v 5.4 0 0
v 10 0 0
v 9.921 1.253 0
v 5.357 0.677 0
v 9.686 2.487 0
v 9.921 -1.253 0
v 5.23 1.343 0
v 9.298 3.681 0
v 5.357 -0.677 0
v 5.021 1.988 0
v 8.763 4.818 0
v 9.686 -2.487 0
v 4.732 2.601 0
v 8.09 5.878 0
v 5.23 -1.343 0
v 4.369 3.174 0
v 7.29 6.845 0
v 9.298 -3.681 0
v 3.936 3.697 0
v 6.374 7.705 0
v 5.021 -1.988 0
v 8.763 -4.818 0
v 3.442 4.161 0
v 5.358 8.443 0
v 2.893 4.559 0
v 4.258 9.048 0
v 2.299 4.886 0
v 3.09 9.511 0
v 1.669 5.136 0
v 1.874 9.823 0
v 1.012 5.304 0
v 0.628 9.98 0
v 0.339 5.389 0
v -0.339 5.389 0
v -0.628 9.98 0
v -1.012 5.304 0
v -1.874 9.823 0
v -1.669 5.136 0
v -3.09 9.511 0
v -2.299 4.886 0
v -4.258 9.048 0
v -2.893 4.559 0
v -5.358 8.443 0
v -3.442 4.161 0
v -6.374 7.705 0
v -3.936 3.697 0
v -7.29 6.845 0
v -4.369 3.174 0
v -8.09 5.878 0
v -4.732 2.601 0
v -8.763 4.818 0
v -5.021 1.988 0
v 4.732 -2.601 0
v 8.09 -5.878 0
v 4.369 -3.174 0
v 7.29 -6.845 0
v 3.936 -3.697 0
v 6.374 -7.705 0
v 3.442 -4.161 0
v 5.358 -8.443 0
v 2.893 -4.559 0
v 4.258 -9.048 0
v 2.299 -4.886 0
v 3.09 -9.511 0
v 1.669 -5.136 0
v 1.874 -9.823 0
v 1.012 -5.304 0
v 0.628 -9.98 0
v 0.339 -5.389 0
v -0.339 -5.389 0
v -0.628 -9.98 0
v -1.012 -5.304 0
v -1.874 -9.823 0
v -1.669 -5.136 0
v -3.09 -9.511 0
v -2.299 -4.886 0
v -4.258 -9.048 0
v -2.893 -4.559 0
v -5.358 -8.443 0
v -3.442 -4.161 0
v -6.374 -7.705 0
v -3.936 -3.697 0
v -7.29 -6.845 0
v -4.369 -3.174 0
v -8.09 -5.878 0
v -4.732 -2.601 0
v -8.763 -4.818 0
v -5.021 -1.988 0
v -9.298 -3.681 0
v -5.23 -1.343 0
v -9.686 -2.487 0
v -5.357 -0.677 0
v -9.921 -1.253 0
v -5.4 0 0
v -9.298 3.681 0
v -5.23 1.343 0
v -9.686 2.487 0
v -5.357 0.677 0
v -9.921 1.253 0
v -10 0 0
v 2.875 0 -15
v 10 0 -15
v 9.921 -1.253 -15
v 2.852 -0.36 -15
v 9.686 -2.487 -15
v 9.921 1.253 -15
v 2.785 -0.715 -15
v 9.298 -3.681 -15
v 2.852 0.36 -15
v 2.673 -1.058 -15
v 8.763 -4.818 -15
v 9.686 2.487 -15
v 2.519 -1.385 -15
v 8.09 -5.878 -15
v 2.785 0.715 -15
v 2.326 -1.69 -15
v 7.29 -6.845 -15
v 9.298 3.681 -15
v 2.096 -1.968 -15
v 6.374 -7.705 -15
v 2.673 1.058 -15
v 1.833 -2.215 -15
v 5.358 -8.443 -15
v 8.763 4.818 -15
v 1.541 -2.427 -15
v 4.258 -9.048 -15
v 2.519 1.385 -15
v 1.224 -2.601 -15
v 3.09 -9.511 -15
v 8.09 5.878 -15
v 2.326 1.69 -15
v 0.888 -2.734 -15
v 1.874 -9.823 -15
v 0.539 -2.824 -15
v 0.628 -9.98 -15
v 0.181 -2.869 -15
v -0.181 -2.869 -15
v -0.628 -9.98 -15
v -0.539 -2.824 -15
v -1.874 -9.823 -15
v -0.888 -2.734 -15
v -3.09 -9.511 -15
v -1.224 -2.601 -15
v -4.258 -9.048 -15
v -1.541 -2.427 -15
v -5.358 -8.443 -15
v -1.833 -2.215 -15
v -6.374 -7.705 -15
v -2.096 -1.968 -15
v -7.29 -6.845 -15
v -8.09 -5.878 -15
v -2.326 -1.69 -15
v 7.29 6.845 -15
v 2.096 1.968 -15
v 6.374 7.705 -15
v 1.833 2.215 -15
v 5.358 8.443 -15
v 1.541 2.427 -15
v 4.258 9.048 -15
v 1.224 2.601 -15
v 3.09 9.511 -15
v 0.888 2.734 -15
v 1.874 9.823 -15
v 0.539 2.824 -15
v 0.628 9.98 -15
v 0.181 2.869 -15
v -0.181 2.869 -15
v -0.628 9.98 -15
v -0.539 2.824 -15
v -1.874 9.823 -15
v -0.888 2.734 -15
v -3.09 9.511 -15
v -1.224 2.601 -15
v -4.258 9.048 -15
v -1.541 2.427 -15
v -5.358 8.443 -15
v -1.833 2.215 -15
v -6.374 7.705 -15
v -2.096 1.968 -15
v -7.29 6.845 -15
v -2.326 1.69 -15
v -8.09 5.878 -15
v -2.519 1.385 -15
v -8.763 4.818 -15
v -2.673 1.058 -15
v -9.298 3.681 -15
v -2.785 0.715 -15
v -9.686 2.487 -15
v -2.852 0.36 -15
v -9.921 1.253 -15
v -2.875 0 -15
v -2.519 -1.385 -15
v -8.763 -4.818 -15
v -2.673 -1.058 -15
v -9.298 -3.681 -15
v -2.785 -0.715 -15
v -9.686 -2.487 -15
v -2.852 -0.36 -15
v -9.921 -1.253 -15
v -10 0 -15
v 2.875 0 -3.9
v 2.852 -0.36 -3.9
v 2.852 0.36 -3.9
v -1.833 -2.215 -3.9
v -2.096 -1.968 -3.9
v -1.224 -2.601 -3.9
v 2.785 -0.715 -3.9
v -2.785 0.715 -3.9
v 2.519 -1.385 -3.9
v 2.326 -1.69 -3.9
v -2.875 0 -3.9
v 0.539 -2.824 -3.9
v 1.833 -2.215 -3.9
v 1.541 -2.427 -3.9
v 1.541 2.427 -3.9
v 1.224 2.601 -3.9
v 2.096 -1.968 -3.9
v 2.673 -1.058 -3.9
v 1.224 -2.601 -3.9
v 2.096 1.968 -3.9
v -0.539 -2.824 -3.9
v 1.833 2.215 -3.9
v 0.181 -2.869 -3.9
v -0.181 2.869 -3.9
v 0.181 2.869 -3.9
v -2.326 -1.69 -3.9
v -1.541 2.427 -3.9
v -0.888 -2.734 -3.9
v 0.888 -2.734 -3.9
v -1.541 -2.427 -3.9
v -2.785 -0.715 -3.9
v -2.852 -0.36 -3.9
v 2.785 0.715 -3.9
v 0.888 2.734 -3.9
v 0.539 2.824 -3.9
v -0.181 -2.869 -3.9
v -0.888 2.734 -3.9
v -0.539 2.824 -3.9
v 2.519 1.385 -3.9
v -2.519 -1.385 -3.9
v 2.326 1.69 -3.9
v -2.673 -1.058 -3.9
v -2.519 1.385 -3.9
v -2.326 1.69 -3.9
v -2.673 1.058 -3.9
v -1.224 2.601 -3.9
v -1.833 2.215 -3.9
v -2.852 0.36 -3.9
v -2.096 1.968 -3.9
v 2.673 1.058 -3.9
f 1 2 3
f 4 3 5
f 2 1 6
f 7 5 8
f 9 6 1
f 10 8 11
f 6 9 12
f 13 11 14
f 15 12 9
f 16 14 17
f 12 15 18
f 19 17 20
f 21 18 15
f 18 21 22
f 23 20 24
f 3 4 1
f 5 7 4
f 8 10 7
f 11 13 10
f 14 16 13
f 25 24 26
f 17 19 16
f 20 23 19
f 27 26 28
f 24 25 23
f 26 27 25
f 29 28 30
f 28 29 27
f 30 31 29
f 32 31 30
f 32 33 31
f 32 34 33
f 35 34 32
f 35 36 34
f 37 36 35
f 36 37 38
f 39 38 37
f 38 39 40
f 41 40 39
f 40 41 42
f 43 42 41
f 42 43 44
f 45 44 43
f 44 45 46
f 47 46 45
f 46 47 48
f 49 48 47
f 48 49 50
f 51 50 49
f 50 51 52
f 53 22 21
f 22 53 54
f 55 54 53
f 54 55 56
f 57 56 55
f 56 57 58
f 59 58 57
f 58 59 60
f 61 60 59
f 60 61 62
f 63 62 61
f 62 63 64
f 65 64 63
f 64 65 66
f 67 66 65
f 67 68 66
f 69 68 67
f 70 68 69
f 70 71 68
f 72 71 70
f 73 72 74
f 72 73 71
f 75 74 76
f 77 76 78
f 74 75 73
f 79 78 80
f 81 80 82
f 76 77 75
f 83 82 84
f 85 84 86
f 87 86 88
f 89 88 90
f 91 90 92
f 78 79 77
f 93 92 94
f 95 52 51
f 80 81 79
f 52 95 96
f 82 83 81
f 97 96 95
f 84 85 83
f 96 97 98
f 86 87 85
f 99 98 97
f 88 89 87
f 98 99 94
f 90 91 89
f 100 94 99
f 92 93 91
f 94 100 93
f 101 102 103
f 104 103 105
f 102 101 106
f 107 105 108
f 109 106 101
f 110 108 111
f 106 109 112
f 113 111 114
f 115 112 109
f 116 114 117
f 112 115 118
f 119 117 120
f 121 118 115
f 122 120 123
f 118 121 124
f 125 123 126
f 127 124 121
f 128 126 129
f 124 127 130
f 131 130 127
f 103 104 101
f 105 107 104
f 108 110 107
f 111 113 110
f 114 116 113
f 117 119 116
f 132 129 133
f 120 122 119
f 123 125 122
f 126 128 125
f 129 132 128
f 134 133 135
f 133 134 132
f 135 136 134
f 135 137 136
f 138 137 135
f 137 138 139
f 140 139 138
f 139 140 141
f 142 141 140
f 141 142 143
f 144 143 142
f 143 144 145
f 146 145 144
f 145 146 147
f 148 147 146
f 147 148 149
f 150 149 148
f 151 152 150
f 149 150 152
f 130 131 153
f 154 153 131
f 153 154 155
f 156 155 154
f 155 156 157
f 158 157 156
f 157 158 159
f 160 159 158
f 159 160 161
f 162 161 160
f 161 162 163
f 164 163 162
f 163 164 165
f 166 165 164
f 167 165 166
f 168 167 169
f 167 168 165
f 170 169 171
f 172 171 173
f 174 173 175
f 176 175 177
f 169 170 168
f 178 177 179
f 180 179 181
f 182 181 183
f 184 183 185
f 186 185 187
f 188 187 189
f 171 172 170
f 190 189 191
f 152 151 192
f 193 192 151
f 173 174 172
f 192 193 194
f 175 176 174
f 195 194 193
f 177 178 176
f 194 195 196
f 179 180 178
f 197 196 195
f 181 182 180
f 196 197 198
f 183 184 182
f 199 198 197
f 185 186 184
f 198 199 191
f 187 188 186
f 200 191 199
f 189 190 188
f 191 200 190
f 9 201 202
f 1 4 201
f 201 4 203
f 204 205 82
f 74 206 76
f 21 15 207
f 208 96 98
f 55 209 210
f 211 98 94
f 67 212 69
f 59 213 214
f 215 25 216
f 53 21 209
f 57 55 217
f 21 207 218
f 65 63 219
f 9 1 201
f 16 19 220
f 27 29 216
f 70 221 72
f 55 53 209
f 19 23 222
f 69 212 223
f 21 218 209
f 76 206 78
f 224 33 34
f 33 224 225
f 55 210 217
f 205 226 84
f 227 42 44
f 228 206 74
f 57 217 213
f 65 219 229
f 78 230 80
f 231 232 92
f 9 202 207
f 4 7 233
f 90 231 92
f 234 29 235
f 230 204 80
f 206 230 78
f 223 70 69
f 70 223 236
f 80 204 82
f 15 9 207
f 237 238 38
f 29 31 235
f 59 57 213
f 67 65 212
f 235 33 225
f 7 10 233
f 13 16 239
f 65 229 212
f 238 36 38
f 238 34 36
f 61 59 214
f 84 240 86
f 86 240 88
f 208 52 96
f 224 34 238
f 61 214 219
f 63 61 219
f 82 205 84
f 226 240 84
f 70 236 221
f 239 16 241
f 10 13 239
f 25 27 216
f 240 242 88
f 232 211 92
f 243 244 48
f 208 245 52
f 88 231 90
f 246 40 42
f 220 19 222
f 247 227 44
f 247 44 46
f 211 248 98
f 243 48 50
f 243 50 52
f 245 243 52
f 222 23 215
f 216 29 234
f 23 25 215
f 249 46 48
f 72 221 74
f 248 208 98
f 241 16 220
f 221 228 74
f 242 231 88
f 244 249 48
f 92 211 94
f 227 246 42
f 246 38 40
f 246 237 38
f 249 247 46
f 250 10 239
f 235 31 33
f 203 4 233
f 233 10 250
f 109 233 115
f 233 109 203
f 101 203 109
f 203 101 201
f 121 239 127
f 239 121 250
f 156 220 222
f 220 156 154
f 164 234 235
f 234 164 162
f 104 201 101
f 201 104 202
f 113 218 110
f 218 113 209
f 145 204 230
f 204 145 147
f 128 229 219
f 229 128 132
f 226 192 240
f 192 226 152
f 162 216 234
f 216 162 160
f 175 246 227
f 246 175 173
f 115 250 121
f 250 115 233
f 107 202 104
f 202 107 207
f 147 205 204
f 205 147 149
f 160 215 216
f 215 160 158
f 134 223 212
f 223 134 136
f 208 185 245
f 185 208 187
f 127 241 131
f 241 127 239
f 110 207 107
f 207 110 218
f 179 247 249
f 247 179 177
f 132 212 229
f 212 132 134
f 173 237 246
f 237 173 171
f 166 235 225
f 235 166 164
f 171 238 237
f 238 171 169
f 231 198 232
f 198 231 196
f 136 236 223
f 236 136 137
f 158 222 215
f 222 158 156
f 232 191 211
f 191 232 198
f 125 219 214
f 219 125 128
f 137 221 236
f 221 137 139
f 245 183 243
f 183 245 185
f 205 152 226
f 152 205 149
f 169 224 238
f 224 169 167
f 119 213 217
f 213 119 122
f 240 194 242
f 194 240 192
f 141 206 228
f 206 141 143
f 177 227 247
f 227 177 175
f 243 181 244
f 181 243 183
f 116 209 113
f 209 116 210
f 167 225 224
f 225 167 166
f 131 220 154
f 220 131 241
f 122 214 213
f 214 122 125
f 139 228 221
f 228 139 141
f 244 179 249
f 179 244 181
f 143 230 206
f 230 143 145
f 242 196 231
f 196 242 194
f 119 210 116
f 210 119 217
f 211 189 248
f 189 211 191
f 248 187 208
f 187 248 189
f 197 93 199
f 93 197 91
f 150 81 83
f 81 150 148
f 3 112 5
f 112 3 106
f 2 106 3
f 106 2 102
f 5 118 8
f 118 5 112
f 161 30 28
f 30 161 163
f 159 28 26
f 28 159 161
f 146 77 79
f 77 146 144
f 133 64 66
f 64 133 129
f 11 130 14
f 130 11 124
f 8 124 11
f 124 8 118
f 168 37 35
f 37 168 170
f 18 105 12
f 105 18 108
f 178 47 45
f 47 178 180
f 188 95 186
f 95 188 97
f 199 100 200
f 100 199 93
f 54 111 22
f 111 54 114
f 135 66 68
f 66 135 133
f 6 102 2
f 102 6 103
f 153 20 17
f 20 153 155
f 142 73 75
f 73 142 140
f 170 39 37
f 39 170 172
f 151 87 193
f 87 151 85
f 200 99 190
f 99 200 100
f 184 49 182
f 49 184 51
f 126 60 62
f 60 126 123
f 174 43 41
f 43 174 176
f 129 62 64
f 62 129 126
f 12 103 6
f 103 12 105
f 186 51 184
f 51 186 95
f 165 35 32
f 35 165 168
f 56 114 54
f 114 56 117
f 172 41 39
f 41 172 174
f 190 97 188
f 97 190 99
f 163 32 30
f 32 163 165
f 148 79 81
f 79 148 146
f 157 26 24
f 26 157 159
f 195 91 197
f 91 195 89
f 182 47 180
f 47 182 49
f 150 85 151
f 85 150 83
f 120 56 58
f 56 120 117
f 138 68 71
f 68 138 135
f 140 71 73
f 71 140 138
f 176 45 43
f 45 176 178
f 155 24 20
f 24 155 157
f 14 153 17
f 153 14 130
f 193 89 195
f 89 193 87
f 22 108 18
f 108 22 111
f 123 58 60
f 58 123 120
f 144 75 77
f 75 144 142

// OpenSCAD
$fn = 50;


difference() {
	union() {
		translate(v = [0, 0, -15.0000000000]) {
			cylinder(h = 15, r = 10.0000000000);
		}
		cylinder(h = 0, r = 13.0000000000);
	}
	union() {
		translate(v = [0, 0, 0]) {
			rotate(a = [0, 0, 0]) {
				difference() {
					union() {
						#translate(v = [0, 0, -15.0000000000]) {
							cylinder(h = 15, r = 2.6000000000);
						}
						#translate(v = [0, 0, -3.9000000000]) {
							cylinder(h = 3.9000000000, r1 = 2.8750000000, r2 = 5.4000000000);
						}
						#translate(v = [0, 0, -15.0000000000]) {
							cylinder(h = 15, r = 2.8750000000);
						}
						#translate(v = [0, 0, -15.0000000000]) {
							cylinder(h = 15, r = 2.6000000000);
						}
					}
					union();
				}
			}
		}
	}
}
